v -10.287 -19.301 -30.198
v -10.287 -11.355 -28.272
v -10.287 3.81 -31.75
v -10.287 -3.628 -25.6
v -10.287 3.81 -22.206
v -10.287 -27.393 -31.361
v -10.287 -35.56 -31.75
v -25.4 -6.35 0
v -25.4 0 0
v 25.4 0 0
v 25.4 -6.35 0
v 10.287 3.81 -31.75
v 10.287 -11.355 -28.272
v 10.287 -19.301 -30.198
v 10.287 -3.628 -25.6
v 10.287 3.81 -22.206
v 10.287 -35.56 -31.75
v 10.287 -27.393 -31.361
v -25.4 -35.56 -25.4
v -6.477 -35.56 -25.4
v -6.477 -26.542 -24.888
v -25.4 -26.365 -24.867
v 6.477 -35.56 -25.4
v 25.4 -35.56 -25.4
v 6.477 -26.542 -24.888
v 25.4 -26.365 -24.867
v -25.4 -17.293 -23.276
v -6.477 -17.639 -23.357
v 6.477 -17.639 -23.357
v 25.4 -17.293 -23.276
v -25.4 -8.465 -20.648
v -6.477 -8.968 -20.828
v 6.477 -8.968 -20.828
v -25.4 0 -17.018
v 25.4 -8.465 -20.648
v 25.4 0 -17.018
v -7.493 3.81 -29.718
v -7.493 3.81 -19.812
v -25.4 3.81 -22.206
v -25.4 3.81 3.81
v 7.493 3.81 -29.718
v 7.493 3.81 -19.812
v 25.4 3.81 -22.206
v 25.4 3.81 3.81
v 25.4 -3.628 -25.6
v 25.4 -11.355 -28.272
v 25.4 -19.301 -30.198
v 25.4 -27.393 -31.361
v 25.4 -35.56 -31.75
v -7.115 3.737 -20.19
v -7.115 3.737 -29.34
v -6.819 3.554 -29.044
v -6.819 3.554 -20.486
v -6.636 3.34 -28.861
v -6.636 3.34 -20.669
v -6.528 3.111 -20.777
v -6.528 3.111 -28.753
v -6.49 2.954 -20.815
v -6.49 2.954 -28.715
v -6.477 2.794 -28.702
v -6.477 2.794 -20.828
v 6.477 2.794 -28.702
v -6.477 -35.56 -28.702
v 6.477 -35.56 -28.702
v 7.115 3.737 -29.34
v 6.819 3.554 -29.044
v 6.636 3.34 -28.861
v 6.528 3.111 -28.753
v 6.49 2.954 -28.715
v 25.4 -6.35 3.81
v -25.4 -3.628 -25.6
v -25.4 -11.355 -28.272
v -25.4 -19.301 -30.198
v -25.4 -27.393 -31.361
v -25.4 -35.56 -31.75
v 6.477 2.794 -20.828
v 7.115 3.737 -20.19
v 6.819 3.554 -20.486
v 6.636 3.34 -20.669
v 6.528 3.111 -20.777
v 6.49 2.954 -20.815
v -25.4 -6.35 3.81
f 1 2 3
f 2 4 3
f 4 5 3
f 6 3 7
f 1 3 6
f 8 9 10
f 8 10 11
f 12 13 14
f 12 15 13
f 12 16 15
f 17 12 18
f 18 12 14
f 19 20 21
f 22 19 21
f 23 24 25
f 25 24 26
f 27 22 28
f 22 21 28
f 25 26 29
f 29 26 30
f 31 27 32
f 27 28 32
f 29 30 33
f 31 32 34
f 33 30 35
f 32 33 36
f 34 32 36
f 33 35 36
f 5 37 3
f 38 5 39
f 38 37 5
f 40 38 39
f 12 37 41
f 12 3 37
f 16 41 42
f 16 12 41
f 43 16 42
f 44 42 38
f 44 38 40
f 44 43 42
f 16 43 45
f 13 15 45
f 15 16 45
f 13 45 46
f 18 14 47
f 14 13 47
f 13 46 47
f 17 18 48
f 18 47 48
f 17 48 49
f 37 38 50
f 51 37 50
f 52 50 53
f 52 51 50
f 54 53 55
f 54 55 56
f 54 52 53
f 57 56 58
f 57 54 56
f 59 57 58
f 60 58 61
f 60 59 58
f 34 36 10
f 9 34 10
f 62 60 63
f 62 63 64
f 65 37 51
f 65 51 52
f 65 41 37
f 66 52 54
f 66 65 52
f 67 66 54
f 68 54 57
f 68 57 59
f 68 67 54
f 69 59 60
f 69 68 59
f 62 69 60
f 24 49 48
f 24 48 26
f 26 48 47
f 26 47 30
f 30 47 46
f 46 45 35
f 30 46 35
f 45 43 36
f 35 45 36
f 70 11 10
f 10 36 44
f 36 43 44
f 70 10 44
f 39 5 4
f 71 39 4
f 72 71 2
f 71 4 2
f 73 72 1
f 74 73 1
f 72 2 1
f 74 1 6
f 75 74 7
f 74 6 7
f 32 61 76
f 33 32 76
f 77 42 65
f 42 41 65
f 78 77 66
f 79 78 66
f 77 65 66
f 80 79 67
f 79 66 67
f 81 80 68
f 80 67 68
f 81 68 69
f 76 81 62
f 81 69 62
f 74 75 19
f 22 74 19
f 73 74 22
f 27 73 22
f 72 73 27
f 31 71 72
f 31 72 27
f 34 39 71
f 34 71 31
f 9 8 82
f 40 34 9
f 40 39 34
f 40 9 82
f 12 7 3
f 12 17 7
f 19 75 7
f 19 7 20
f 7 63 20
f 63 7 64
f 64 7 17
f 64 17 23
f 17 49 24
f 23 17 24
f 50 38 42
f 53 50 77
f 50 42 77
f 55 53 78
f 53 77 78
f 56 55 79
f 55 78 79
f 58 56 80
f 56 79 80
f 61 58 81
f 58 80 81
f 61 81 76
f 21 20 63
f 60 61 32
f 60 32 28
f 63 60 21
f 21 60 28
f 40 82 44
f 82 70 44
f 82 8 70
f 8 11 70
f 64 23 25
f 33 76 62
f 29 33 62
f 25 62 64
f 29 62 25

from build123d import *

# Parameters (mm, degrees)
BOSS_EXTRUDE1_DEPTH = 25.4
BOSS_EXTRUDE2_DEPTH = 10.287
SKETCH4_W           = 12.954
SKETCH4_H           = 7.874
CUT_EXTRUDE1_DEPTH  = 57.596991086
FILLET2_R           = 1.016


with BuildPart() as part:
    # Sketch2 → Boss-Extrude1 (new, symmetric)
    with BuildSketch(Plane(origin=(0, 0, 0), x_dir=(0, 0, -1), z_dir=(1, 0, 0))):
        with BuildLine():
            Line((0, 0), (0, -6.35))
            Line((0, -6.35), (-3.81, -6.35))
            Line((-3.81, -6.35), (-3.81, 3.81))
            Line((-3.81, 3.81), (22.20557735, 3.81))
            ThreePointArc((22.20557735, 3.81), (29.329829331, -15.304797559), (31.75, -35.56))
            Line((31.75, -35.56), (25.4, -35.56))
            ThreePointArc((25.4, -35.56), (23.276174446, -17.292737452), (17.018, 0))
            Line((17.018, 0), (0, 0))
        make_face()
    extrude(amount=BOSS_EXTRUDE1_DEPTH, both=True)

    # Sketch3 → Boss-Extrude2 (add, symmetric)
    with BuildSketch(Plane(origin=(0, 0, 0), x_dir=(0, 0, -1), z_dir=(1, 0, 0))):
        Polygon((31.75, -35.56), (31.75, 3.81), (22.20557735, 3.81), align=None)
    extrude(amount=BOSS_EXTRUDE2_DEPTH, both=True)

    # Sketch4 → Cut-Extrude1 (cut, through all)
    with BuildSketch(Plane(origin=(0, 3.81, 0), x_dir=(1, 0, 0), z_dir=(0, 1, 0))):
        with Locations((0, 24.765)):
            Rectangle(SKETCH4_W, SKETCH4_H)
    extrude(amount=-CUT_EXTRUDE1_DEPTH, mode=Mode.SUBTRACT)

    # Fillet2
    fillet2_edges = [part.edges().sort_by_distance(p)[0] for p in [
        (-6.477, 3.81, -24.765),
        (0, 3.81, -20.828),
        (6.477, 3.81, -24.765),
        (0, 3.81, -28.702),
    ]]
    fillet(fillet2_edges, radius=FILLET2_R)


solid = part.part
